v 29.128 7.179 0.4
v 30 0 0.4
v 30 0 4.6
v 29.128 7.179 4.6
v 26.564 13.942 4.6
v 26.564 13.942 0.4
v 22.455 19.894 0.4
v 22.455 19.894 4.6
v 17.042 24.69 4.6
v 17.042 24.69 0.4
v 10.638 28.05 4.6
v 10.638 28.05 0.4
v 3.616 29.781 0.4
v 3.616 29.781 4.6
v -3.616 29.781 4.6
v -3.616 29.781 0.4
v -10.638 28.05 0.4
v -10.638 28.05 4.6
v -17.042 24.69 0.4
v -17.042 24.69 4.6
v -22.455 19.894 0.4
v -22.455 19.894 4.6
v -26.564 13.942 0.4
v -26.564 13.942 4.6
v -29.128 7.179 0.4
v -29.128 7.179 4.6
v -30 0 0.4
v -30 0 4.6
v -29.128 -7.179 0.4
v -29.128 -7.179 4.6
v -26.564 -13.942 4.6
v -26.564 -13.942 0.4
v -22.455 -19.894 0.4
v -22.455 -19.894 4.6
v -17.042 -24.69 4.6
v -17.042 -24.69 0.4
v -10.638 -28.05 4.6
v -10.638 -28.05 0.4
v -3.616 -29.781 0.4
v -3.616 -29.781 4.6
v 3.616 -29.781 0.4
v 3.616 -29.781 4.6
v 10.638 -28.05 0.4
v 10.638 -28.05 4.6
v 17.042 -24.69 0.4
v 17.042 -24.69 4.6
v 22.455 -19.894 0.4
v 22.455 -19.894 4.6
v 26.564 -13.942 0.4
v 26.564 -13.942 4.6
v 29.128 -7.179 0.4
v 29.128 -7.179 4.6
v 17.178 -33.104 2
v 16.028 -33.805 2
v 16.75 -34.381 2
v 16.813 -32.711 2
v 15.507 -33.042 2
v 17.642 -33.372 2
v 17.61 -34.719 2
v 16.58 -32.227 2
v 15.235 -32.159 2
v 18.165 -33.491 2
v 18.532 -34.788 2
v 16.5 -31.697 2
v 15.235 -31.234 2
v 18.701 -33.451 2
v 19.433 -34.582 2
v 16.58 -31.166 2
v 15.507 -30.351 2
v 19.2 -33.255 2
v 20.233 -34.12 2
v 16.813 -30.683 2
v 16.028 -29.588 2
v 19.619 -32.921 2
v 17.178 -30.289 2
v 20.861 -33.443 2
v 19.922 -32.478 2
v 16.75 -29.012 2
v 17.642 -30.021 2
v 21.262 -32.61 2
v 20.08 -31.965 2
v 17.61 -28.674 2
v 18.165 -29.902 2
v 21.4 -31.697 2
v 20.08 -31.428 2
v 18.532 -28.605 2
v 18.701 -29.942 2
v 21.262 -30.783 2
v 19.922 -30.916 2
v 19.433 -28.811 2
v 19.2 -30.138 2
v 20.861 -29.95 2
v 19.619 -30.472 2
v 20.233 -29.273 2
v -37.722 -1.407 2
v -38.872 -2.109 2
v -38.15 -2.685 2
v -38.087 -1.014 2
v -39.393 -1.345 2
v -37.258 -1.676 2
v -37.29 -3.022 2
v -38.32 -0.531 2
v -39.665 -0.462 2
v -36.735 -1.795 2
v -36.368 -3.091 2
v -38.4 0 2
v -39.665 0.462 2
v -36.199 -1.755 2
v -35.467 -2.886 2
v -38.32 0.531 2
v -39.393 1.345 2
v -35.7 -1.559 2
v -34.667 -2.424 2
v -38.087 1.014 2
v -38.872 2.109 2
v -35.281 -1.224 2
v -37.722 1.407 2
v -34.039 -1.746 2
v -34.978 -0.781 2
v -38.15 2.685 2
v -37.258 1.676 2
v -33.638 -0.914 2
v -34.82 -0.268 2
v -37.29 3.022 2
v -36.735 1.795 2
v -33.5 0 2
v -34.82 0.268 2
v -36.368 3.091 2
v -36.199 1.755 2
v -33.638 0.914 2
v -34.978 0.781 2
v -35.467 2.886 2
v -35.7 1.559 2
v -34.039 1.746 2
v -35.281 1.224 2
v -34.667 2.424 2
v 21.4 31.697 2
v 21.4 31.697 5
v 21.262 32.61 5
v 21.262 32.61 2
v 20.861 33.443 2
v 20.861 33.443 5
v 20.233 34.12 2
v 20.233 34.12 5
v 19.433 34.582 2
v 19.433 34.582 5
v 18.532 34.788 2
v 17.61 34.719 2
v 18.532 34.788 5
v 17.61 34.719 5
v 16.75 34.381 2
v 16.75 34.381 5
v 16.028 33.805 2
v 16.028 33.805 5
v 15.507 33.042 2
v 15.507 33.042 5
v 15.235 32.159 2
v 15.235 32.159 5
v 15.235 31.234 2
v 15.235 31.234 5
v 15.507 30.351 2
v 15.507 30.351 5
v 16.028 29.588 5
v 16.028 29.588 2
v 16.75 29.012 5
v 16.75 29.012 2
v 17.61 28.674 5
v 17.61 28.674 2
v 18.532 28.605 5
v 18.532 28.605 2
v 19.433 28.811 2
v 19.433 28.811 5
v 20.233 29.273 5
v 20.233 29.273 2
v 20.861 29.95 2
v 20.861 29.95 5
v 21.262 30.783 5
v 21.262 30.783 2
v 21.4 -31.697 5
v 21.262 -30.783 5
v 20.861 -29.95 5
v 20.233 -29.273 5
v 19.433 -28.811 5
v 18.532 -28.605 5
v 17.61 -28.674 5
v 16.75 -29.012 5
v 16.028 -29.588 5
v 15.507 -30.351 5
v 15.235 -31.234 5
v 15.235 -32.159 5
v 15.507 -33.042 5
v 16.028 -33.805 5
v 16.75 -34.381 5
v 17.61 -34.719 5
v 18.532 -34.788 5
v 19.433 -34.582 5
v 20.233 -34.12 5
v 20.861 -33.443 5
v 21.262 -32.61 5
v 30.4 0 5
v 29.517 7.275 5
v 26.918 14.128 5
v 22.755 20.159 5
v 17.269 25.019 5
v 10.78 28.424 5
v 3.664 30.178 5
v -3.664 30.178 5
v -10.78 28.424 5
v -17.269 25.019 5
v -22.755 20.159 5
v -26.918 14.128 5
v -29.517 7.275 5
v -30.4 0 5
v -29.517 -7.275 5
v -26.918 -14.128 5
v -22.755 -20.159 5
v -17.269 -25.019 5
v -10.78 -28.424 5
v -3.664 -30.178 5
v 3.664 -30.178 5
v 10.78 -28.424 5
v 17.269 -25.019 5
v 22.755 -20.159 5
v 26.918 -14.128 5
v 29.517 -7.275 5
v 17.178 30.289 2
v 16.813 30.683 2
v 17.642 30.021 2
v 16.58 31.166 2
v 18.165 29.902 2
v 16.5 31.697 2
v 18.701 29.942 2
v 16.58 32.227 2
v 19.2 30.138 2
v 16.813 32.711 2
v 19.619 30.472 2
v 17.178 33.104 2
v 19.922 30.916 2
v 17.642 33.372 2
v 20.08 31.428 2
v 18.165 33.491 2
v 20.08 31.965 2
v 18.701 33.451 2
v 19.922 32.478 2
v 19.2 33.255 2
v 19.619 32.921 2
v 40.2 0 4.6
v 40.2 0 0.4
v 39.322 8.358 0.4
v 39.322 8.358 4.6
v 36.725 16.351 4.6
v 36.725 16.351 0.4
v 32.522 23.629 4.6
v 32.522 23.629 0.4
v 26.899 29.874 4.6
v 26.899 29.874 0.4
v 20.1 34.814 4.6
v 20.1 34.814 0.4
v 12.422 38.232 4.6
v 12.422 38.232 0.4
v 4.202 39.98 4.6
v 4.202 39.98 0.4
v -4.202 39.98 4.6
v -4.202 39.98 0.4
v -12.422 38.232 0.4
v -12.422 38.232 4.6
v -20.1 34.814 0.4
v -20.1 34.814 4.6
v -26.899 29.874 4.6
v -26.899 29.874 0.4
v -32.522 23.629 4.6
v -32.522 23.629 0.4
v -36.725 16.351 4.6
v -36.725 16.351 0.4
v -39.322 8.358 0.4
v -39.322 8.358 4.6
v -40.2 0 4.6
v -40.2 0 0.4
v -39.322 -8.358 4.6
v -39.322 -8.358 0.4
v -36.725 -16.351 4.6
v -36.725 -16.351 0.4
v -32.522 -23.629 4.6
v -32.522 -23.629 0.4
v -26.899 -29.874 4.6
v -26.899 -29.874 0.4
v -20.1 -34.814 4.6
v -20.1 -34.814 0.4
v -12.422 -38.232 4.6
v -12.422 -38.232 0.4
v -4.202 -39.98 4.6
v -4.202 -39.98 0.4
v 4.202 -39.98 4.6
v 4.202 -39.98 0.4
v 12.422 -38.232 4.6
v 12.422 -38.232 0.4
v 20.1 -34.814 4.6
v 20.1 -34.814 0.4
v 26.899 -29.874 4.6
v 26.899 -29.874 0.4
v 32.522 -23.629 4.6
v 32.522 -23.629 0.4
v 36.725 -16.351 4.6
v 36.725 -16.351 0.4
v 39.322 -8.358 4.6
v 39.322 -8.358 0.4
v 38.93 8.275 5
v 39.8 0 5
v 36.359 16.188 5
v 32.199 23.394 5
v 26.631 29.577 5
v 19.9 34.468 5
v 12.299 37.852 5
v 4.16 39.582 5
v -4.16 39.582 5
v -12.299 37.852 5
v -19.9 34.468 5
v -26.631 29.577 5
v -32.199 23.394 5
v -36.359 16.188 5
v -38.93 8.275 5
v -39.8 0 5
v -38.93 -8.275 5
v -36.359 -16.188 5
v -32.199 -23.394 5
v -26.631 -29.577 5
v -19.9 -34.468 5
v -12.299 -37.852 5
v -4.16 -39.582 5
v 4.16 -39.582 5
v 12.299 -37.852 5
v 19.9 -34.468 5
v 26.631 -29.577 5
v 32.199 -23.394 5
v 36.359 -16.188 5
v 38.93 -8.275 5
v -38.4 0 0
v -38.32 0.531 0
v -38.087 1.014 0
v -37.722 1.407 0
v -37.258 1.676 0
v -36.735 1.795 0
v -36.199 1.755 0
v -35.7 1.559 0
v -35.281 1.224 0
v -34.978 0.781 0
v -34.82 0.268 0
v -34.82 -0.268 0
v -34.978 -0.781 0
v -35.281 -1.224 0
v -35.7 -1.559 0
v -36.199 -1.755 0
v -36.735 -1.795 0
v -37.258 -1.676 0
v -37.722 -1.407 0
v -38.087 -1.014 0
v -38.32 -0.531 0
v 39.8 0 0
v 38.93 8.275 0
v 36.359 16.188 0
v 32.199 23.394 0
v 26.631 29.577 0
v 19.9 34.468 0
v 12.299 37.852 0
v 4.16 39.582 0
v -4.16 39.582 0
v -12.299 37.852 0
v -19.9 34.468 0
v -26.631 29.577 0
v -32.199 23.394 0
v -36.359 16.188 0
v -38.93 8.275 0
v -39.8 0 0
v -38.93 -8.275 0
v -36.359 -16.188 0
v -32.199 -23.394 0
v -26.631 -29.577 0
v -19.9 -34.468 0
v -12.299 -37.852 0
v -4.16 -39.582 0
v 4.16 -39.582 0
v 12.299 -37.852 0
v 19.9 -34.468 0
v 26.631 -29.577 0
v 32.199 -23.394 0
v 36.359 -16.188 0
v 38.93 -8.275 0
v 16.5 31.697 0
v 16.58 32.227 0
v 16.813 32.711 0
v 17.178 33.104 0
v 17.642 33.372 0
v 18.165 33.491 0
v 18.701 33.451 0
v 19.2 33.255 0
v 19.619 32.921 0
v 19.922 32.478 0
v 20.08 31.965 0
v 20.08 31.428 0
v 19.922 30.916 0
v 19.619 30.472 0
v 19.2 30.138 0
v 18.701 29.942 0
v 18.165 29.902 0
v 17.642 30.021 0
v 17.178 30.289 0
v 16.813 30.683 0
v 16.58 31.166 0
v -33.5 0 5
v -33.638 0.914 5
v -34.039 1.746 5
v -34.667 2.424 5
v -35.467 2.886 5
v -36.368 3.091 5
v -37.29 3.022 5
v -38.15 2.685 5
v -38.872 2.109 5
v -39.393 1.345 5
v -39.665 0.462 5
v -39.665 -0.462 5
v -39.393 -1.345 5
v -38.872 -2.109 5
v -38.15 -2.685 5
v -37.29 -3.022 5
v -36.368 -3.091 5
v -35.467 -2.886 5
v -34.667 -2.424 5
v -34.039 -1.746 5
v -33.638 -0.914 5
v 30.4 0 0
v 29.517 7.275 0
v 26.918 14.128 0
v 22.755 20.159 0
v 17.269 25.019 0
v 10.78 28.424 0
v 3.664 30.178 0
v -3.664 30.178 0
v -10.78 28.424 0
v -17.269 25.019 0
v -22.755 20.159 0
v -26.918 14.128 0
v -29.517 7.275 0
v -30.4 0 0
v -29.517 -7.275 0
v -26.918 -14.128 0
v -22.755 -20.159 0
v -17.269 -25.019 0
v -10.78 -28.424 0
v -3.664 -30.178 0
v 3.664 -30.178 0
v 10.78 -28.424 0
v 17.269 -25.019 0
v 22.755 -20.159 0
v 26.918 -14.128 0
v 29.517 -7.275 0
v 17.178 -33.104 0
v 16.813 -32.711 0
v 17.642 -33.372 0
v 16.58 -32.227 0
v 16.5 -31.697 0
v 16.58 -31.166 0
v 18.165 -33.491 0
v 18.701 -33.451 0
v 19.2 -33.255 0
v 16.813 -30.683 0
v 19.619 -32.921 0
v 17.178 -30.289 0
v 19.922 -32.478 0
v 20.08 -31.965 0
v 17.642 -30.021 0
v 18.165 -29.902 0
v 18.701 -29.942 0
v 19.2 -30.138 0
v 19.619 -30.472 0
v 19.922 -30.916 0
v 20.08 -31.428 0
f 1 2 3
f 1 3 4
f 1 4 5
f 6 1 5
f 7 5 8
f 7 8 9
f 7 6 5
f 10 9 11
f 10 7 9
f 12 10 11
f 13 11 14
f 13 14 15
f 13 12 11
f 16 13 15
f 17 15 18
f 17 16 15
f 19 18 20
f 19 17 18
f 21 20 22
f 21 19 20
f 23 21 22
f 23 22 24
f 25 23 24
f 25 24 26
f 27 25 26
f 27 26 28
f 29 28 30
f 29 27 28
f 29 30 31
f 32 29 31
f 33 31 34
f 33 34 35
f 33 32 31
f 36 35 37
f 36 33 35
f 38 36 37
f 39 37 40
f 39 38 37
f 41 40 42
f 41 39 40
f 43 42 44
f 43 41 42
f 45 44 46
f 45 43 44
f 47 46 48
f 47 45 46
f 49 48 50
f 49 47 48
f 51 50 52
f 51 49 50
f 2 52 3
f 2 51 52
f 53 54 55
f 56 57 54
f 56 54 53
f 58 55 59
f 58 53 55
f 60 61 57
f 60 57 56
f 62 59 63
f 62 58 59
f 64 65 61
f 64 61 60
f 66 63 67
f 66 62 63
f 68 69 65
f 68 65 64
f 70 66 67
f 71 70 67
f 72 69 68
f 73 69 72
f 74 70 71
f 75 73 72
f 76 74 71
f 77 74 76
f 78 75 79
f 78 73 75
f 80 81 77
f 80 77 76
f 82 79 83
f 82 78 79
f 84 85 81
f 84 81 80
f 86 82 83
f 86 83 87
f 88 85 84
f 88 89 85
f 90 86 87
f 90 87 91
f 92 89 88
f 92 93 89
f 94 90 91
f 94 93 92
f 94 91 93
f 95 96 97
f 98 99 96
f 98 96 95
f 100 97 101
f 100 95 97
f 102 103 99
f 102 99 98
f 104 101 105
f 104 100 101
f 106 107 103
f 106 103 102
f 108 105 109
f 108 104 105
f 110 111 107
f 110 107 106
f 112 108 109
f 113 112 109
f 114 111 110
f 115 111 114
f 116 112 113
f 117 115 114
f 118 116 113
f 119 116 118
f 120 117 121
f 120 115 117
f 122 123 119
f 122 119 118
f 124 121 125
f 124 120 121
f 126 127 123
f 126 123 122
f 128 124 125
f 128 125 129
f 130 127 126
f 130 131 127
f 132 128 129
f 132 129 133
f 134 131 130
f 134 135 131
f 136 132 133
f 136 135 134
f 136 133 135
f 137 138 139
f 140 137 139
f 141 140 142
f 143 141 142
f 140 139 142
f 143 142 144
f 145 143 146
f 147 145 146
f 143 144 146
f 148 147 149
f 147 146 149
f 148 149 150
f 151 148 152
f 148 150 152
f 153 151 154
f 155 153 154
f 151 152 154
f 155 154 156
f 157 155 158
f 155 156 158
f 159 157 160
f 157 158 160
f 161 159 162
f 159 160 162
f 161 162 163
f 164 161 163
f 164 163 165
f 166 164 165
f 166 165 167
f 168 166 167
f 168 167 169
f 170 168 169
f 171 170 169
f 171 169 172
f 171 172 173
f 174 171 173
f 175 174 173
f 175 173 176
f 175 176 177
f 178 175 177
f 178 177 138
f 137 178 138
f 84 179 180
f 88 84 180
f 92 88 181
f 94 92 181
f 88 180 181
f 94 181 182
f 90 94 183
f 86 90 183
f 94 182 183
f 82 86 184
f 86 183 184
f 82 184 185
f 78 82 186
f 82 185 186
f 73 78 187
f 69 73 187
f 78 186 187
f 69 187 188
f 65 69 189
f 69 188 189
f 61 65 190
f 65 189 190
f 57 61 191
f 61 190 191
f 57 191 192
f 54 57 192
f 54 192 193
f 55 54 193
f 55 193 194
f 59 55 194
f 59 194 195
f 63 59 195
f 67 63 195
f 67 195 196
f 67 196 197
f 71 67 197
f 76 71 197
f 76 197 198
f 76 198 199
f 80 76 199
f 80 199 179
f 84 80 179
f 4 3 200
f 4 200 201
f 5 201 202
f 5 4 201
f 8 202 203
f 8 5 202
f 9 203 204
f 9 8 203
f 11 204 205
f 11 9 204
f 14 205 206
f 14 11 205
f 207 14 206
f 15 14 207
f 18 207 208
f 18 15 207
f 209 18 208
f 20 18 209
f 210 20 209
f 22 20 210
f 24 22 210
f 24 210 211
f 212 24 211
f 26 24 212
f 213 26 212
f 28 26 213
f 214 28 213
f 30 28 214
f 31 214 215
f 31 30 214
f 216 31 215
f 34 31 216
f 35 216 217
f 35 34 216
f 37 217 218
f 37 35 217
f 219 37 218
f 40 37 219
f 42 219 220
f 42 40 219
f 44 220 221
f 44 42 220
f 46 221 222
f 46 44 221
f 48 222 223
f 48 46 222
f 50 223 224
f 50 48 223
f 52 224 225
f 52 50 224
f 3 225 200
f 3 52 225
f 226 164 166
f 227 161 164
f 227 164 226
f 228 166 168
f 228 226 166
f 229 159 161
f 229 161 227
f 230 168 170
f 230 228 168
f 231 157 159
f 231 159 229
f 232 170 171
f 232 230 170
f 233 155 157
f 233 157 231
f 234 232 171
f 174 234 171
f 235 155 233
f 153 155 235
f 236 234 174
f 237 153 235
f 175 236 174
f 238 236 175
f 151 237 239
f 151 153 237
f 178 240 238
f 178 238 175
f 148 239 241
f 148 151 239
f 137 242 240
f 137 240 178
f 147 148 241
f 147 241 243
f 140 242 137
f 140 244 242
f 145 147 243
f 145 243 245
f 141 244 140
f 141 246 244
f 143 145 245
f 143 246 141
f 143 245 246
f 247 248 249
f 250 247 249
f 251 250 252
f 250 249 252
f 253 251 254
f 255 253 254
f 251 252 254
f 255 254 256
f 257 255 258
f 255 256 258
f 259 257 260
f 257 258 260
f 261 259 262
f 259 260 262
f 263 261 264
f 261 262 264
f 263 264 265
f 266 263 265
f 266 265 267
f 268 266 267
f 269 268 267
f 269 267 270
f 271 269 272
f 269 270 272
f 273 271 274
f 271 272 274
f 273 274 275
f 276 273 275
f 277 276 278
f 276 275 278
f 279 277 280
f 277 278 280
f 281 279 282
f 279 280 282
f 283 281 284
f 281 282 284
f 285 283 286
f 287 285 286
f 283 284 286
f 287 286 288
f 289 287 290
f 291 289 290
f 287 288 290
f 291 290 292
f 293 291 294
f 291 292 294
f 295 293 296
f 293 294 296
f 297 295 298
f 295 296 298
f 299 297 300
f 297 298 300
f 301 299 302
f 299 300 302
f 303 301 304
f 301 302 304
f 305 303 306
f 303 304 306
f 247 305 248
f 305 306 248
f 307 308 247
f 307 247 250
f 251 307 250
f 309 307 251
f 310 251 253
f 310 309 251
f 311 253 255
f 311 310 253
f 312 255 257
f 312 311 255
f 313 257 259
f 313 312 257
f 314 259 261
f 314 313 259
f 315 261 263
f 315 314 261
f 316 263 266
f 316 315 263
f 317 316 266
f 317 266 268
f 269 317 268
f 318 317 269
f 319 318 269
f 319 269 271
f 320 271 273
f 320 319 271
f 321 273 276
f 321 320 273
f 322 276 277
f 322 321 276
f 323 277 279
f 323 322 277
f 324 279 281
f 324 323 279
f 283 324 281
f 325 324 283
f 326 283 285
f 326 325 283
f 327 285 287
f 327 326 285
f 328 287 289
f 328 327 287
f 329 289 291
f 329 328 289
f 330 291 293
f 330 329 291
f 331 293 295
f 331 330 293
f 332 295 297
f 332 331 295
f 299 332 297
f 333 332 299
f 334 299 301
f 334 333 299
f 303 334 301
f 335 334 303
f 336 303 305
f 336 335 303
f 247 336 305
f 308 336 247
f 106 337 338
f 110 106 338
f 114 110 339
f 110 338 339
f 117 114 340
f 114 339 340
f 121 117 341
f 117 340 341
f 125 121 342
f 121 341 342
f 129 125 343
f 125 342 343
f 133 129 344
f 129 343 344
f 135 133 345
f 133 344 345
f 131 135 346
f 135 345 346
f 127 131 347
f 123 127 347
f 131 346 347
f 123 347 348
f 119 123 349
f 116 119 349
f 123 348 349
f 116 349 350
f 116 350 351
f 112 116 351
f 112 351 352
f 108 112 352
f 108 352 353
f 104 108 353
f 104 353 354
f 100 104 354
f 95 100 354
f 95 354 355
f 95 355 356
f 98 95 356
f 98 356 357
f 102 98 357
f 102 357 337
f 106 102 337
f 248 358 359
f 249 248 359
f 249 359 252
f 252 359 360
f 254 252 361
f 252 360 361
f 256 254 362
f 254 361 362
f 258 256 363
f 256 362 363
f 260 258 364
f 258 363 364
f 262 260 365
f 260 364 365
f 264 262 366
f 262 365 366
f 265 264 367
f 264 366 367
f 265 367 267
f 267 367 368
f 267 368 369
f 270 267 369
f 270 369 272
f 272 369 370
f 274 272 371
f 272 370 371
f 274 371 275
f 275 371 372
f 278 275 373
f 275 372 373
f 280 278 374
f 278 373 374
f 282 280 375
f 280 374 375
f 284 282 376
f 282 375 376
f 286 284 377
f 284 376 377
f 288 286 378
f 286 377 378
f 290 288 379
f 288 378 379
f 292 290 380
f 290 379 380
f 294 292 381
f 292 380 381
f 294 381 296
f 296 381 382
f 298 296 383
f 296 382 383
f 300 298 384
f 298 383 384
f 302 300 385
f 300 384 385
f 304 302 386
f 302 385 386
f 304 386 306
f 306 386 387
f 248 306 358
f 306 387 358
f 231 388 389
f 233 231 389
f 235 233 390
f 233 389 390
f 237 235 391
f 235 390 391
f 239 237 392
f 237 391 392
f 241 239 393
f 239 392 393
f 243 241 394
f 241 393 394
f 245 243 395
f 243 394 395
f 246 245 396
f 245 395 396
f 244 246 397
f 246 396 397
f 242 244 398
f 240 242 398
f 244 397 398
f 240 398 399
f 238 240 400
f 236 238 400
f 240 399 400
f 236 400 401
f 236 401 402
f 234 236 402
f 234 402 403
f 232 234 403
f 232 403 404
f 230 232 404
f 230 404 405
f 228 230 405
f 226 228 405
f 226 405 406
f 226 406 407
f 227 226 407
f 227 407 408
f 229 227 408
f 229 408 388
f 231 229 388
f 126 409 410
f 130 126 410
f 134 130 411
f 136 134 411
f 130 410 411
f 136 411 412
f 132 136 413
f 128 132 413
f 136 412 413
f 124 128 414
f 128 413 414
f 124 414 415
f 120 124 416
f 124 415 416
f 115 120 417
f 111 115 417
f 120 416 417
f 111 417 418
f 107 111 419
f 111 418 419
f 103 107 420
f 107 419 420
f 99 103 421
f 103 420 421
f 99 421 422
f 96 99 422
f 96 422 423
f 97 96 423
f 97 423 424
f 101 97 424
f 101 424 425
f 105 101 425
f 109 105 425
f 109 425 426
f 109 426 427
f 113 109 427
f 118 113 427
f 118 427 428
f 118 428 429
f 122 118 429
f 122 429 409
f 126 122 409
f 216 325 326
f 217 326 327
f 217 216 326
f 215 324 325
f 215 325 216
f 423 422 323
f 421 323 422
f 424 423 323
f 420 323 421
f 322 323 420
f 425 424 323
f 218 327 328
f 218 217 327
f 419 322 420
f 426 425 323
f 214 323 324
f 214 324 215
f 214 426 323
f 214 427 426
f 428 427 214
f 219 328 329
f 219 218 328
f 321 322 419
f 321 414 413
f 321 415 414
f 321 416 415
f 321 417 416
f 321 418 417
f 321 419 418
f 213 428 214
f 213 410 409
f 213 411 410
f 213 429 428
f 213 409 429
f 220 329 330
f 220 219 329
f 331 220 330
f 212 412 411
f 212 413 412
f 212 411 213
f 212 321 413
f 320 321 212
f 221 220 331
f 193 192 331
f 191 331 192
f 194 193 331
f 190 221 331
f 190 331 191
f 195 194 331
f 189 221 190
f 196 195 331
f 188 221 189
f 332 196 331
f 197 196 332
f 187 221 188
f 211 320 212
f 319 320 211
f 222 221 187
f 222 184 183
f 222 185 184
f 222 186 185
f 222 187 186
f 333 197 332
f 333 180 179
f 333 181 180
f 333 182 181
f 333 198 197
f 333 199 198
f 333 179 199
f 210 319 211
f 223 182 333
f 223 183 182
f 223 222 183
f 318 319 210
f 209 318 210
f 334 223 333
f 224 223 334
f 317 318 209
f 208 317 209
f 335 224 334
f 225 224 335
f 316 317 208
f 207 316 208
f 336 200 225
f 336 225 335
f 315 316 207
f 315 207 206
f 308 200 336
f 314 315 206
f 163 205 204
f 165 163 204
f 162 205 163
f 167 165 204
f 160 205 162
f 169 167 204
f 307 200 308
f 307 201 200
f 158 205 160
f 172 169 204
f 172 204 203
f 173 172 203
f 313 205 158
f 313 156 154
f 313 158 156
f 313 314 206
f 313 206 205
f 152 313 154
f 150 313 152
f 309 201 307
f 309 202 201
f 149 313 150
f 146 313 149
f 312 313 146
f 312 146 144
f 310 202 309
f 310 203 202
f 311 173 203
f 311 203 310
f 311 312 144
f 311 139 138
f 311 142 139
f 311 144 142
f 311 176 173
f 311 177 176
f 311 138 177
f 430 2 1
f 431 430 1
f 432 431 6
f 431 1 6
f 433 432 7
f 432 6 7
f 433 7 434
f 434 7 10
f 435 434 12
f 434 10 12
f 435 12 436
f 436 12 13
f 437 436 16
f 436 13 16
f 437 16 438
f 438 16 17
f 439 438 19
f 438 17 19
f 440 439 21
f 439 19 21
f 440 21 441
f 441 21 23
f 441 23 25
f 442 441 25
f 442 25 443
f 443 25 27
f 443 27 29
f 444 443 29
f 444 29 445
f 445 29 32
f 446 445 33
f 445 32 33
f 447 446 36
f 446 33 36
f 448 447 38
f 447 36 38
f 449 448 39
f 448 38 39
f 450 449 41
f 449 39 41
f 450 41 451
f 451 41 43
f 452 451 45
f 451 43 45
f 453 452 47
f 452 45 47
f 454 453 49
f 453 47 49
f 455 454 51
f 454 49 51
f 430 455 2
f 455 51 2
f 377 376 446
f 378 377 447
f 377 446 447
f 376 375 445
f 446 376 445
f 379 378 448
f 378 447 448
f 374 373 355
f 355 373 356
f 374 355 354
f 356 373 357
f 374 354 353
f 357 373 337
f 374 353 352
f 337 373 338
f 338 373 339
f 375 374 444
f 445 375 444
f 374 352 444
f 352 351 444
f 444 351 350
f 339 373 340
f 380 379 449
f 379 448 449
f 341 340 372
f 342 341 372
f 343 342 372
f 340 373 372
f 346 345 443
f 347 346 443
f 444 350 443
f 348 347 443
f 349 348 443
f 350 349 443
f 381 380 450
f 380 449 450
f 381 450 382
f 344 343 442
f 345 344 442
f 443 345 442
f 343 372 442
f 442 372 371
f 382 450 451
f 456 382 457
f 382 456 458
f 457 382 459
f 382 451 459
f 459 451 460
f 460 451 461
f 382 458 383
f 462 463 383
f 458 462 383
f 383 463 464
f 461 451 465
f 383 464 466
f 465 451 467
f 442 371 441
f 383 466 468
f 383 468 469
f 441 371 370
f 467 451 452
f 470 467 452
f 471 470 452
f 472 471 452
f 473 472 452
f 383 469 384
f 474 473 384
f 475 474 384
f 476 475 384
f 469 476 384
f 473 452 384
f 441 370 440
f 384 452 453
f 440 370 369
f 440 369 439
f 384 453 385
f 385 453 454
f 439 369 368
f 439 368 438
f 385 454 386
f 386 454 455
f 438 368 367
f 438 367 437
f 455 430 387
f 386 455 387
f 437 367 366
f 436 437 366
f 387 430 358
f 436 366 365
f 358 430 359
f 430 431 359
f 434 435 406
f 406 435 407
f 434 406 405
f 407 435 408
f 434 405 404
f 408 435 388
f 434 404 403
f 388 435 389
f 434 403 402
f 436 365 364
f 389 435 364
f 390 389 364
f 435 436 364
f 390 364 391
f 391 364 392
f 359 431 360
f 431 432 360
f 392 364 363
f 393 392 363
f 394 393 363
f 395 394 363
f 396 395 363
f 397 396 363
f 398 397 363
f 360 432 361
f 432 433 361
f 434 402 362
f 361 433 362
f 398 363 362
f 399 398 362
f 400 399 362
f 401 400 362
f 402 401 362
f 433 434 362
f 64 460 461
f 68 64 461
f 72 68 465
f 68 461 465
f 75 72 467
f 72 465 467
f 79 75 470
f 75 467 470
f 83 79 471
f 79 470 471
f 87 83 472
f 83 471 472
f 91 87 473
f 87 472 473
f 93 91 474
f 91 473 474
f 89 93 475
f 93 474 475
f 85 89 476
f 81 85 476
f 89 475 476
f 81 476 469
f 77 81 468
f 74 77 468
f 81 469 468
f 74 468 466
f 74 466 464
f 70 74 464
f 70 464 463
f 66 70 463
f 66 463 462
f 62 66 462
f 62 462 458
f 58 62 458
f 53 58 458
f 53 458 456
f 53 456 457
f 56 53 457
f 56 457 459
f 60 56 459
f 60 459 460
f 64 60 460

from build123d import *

# Parameters (mm, degrees)
SKETCH_R         = 40.2
SKETCH_R_2       = 30
PAD_DEPTH        = 5
HOLE_D           = 3.6
HOLE_DEPTH       = 5
HOLE_CBORE_D     = 6.2
HOLE_CBORE_DEPTH = 3
CHAMFER_SIZE     = 0.4


with BuildPart() as part:
    # Sketch → Pad (new body)
    with BuildSketch(Plane.XY):
        Circle(SKETCH_R)
        Circle(SKETCH_R_2, mode=Mode.SUBTRACT)
    extrude(amount=PAD_DEPTH)

    # Hole
    with Locations(Plane.XY.offset(5)):
        with Locations((-36.6, 0), (18.3, 31.69653), (18.3, -31.69653)):
            CounterBoreHole(HOLE_D / 2, HOLE_CBORE_D / 2, HOLE_CBORE_DEPTH, depth=HOLE_DEPTH)

    # Chamfer
    chamfer_edges = [part.edges().sort_by_distance(p)[0] for p in [
        (-40.2, 0, 5),
        (-30, 0, 5),
        (-40.2, 0, 0),
        (-30, 0, 0),
    ]]
    chamfer(chamfer_edges, length=CHAMFER_SIZE)


solid = part.part
